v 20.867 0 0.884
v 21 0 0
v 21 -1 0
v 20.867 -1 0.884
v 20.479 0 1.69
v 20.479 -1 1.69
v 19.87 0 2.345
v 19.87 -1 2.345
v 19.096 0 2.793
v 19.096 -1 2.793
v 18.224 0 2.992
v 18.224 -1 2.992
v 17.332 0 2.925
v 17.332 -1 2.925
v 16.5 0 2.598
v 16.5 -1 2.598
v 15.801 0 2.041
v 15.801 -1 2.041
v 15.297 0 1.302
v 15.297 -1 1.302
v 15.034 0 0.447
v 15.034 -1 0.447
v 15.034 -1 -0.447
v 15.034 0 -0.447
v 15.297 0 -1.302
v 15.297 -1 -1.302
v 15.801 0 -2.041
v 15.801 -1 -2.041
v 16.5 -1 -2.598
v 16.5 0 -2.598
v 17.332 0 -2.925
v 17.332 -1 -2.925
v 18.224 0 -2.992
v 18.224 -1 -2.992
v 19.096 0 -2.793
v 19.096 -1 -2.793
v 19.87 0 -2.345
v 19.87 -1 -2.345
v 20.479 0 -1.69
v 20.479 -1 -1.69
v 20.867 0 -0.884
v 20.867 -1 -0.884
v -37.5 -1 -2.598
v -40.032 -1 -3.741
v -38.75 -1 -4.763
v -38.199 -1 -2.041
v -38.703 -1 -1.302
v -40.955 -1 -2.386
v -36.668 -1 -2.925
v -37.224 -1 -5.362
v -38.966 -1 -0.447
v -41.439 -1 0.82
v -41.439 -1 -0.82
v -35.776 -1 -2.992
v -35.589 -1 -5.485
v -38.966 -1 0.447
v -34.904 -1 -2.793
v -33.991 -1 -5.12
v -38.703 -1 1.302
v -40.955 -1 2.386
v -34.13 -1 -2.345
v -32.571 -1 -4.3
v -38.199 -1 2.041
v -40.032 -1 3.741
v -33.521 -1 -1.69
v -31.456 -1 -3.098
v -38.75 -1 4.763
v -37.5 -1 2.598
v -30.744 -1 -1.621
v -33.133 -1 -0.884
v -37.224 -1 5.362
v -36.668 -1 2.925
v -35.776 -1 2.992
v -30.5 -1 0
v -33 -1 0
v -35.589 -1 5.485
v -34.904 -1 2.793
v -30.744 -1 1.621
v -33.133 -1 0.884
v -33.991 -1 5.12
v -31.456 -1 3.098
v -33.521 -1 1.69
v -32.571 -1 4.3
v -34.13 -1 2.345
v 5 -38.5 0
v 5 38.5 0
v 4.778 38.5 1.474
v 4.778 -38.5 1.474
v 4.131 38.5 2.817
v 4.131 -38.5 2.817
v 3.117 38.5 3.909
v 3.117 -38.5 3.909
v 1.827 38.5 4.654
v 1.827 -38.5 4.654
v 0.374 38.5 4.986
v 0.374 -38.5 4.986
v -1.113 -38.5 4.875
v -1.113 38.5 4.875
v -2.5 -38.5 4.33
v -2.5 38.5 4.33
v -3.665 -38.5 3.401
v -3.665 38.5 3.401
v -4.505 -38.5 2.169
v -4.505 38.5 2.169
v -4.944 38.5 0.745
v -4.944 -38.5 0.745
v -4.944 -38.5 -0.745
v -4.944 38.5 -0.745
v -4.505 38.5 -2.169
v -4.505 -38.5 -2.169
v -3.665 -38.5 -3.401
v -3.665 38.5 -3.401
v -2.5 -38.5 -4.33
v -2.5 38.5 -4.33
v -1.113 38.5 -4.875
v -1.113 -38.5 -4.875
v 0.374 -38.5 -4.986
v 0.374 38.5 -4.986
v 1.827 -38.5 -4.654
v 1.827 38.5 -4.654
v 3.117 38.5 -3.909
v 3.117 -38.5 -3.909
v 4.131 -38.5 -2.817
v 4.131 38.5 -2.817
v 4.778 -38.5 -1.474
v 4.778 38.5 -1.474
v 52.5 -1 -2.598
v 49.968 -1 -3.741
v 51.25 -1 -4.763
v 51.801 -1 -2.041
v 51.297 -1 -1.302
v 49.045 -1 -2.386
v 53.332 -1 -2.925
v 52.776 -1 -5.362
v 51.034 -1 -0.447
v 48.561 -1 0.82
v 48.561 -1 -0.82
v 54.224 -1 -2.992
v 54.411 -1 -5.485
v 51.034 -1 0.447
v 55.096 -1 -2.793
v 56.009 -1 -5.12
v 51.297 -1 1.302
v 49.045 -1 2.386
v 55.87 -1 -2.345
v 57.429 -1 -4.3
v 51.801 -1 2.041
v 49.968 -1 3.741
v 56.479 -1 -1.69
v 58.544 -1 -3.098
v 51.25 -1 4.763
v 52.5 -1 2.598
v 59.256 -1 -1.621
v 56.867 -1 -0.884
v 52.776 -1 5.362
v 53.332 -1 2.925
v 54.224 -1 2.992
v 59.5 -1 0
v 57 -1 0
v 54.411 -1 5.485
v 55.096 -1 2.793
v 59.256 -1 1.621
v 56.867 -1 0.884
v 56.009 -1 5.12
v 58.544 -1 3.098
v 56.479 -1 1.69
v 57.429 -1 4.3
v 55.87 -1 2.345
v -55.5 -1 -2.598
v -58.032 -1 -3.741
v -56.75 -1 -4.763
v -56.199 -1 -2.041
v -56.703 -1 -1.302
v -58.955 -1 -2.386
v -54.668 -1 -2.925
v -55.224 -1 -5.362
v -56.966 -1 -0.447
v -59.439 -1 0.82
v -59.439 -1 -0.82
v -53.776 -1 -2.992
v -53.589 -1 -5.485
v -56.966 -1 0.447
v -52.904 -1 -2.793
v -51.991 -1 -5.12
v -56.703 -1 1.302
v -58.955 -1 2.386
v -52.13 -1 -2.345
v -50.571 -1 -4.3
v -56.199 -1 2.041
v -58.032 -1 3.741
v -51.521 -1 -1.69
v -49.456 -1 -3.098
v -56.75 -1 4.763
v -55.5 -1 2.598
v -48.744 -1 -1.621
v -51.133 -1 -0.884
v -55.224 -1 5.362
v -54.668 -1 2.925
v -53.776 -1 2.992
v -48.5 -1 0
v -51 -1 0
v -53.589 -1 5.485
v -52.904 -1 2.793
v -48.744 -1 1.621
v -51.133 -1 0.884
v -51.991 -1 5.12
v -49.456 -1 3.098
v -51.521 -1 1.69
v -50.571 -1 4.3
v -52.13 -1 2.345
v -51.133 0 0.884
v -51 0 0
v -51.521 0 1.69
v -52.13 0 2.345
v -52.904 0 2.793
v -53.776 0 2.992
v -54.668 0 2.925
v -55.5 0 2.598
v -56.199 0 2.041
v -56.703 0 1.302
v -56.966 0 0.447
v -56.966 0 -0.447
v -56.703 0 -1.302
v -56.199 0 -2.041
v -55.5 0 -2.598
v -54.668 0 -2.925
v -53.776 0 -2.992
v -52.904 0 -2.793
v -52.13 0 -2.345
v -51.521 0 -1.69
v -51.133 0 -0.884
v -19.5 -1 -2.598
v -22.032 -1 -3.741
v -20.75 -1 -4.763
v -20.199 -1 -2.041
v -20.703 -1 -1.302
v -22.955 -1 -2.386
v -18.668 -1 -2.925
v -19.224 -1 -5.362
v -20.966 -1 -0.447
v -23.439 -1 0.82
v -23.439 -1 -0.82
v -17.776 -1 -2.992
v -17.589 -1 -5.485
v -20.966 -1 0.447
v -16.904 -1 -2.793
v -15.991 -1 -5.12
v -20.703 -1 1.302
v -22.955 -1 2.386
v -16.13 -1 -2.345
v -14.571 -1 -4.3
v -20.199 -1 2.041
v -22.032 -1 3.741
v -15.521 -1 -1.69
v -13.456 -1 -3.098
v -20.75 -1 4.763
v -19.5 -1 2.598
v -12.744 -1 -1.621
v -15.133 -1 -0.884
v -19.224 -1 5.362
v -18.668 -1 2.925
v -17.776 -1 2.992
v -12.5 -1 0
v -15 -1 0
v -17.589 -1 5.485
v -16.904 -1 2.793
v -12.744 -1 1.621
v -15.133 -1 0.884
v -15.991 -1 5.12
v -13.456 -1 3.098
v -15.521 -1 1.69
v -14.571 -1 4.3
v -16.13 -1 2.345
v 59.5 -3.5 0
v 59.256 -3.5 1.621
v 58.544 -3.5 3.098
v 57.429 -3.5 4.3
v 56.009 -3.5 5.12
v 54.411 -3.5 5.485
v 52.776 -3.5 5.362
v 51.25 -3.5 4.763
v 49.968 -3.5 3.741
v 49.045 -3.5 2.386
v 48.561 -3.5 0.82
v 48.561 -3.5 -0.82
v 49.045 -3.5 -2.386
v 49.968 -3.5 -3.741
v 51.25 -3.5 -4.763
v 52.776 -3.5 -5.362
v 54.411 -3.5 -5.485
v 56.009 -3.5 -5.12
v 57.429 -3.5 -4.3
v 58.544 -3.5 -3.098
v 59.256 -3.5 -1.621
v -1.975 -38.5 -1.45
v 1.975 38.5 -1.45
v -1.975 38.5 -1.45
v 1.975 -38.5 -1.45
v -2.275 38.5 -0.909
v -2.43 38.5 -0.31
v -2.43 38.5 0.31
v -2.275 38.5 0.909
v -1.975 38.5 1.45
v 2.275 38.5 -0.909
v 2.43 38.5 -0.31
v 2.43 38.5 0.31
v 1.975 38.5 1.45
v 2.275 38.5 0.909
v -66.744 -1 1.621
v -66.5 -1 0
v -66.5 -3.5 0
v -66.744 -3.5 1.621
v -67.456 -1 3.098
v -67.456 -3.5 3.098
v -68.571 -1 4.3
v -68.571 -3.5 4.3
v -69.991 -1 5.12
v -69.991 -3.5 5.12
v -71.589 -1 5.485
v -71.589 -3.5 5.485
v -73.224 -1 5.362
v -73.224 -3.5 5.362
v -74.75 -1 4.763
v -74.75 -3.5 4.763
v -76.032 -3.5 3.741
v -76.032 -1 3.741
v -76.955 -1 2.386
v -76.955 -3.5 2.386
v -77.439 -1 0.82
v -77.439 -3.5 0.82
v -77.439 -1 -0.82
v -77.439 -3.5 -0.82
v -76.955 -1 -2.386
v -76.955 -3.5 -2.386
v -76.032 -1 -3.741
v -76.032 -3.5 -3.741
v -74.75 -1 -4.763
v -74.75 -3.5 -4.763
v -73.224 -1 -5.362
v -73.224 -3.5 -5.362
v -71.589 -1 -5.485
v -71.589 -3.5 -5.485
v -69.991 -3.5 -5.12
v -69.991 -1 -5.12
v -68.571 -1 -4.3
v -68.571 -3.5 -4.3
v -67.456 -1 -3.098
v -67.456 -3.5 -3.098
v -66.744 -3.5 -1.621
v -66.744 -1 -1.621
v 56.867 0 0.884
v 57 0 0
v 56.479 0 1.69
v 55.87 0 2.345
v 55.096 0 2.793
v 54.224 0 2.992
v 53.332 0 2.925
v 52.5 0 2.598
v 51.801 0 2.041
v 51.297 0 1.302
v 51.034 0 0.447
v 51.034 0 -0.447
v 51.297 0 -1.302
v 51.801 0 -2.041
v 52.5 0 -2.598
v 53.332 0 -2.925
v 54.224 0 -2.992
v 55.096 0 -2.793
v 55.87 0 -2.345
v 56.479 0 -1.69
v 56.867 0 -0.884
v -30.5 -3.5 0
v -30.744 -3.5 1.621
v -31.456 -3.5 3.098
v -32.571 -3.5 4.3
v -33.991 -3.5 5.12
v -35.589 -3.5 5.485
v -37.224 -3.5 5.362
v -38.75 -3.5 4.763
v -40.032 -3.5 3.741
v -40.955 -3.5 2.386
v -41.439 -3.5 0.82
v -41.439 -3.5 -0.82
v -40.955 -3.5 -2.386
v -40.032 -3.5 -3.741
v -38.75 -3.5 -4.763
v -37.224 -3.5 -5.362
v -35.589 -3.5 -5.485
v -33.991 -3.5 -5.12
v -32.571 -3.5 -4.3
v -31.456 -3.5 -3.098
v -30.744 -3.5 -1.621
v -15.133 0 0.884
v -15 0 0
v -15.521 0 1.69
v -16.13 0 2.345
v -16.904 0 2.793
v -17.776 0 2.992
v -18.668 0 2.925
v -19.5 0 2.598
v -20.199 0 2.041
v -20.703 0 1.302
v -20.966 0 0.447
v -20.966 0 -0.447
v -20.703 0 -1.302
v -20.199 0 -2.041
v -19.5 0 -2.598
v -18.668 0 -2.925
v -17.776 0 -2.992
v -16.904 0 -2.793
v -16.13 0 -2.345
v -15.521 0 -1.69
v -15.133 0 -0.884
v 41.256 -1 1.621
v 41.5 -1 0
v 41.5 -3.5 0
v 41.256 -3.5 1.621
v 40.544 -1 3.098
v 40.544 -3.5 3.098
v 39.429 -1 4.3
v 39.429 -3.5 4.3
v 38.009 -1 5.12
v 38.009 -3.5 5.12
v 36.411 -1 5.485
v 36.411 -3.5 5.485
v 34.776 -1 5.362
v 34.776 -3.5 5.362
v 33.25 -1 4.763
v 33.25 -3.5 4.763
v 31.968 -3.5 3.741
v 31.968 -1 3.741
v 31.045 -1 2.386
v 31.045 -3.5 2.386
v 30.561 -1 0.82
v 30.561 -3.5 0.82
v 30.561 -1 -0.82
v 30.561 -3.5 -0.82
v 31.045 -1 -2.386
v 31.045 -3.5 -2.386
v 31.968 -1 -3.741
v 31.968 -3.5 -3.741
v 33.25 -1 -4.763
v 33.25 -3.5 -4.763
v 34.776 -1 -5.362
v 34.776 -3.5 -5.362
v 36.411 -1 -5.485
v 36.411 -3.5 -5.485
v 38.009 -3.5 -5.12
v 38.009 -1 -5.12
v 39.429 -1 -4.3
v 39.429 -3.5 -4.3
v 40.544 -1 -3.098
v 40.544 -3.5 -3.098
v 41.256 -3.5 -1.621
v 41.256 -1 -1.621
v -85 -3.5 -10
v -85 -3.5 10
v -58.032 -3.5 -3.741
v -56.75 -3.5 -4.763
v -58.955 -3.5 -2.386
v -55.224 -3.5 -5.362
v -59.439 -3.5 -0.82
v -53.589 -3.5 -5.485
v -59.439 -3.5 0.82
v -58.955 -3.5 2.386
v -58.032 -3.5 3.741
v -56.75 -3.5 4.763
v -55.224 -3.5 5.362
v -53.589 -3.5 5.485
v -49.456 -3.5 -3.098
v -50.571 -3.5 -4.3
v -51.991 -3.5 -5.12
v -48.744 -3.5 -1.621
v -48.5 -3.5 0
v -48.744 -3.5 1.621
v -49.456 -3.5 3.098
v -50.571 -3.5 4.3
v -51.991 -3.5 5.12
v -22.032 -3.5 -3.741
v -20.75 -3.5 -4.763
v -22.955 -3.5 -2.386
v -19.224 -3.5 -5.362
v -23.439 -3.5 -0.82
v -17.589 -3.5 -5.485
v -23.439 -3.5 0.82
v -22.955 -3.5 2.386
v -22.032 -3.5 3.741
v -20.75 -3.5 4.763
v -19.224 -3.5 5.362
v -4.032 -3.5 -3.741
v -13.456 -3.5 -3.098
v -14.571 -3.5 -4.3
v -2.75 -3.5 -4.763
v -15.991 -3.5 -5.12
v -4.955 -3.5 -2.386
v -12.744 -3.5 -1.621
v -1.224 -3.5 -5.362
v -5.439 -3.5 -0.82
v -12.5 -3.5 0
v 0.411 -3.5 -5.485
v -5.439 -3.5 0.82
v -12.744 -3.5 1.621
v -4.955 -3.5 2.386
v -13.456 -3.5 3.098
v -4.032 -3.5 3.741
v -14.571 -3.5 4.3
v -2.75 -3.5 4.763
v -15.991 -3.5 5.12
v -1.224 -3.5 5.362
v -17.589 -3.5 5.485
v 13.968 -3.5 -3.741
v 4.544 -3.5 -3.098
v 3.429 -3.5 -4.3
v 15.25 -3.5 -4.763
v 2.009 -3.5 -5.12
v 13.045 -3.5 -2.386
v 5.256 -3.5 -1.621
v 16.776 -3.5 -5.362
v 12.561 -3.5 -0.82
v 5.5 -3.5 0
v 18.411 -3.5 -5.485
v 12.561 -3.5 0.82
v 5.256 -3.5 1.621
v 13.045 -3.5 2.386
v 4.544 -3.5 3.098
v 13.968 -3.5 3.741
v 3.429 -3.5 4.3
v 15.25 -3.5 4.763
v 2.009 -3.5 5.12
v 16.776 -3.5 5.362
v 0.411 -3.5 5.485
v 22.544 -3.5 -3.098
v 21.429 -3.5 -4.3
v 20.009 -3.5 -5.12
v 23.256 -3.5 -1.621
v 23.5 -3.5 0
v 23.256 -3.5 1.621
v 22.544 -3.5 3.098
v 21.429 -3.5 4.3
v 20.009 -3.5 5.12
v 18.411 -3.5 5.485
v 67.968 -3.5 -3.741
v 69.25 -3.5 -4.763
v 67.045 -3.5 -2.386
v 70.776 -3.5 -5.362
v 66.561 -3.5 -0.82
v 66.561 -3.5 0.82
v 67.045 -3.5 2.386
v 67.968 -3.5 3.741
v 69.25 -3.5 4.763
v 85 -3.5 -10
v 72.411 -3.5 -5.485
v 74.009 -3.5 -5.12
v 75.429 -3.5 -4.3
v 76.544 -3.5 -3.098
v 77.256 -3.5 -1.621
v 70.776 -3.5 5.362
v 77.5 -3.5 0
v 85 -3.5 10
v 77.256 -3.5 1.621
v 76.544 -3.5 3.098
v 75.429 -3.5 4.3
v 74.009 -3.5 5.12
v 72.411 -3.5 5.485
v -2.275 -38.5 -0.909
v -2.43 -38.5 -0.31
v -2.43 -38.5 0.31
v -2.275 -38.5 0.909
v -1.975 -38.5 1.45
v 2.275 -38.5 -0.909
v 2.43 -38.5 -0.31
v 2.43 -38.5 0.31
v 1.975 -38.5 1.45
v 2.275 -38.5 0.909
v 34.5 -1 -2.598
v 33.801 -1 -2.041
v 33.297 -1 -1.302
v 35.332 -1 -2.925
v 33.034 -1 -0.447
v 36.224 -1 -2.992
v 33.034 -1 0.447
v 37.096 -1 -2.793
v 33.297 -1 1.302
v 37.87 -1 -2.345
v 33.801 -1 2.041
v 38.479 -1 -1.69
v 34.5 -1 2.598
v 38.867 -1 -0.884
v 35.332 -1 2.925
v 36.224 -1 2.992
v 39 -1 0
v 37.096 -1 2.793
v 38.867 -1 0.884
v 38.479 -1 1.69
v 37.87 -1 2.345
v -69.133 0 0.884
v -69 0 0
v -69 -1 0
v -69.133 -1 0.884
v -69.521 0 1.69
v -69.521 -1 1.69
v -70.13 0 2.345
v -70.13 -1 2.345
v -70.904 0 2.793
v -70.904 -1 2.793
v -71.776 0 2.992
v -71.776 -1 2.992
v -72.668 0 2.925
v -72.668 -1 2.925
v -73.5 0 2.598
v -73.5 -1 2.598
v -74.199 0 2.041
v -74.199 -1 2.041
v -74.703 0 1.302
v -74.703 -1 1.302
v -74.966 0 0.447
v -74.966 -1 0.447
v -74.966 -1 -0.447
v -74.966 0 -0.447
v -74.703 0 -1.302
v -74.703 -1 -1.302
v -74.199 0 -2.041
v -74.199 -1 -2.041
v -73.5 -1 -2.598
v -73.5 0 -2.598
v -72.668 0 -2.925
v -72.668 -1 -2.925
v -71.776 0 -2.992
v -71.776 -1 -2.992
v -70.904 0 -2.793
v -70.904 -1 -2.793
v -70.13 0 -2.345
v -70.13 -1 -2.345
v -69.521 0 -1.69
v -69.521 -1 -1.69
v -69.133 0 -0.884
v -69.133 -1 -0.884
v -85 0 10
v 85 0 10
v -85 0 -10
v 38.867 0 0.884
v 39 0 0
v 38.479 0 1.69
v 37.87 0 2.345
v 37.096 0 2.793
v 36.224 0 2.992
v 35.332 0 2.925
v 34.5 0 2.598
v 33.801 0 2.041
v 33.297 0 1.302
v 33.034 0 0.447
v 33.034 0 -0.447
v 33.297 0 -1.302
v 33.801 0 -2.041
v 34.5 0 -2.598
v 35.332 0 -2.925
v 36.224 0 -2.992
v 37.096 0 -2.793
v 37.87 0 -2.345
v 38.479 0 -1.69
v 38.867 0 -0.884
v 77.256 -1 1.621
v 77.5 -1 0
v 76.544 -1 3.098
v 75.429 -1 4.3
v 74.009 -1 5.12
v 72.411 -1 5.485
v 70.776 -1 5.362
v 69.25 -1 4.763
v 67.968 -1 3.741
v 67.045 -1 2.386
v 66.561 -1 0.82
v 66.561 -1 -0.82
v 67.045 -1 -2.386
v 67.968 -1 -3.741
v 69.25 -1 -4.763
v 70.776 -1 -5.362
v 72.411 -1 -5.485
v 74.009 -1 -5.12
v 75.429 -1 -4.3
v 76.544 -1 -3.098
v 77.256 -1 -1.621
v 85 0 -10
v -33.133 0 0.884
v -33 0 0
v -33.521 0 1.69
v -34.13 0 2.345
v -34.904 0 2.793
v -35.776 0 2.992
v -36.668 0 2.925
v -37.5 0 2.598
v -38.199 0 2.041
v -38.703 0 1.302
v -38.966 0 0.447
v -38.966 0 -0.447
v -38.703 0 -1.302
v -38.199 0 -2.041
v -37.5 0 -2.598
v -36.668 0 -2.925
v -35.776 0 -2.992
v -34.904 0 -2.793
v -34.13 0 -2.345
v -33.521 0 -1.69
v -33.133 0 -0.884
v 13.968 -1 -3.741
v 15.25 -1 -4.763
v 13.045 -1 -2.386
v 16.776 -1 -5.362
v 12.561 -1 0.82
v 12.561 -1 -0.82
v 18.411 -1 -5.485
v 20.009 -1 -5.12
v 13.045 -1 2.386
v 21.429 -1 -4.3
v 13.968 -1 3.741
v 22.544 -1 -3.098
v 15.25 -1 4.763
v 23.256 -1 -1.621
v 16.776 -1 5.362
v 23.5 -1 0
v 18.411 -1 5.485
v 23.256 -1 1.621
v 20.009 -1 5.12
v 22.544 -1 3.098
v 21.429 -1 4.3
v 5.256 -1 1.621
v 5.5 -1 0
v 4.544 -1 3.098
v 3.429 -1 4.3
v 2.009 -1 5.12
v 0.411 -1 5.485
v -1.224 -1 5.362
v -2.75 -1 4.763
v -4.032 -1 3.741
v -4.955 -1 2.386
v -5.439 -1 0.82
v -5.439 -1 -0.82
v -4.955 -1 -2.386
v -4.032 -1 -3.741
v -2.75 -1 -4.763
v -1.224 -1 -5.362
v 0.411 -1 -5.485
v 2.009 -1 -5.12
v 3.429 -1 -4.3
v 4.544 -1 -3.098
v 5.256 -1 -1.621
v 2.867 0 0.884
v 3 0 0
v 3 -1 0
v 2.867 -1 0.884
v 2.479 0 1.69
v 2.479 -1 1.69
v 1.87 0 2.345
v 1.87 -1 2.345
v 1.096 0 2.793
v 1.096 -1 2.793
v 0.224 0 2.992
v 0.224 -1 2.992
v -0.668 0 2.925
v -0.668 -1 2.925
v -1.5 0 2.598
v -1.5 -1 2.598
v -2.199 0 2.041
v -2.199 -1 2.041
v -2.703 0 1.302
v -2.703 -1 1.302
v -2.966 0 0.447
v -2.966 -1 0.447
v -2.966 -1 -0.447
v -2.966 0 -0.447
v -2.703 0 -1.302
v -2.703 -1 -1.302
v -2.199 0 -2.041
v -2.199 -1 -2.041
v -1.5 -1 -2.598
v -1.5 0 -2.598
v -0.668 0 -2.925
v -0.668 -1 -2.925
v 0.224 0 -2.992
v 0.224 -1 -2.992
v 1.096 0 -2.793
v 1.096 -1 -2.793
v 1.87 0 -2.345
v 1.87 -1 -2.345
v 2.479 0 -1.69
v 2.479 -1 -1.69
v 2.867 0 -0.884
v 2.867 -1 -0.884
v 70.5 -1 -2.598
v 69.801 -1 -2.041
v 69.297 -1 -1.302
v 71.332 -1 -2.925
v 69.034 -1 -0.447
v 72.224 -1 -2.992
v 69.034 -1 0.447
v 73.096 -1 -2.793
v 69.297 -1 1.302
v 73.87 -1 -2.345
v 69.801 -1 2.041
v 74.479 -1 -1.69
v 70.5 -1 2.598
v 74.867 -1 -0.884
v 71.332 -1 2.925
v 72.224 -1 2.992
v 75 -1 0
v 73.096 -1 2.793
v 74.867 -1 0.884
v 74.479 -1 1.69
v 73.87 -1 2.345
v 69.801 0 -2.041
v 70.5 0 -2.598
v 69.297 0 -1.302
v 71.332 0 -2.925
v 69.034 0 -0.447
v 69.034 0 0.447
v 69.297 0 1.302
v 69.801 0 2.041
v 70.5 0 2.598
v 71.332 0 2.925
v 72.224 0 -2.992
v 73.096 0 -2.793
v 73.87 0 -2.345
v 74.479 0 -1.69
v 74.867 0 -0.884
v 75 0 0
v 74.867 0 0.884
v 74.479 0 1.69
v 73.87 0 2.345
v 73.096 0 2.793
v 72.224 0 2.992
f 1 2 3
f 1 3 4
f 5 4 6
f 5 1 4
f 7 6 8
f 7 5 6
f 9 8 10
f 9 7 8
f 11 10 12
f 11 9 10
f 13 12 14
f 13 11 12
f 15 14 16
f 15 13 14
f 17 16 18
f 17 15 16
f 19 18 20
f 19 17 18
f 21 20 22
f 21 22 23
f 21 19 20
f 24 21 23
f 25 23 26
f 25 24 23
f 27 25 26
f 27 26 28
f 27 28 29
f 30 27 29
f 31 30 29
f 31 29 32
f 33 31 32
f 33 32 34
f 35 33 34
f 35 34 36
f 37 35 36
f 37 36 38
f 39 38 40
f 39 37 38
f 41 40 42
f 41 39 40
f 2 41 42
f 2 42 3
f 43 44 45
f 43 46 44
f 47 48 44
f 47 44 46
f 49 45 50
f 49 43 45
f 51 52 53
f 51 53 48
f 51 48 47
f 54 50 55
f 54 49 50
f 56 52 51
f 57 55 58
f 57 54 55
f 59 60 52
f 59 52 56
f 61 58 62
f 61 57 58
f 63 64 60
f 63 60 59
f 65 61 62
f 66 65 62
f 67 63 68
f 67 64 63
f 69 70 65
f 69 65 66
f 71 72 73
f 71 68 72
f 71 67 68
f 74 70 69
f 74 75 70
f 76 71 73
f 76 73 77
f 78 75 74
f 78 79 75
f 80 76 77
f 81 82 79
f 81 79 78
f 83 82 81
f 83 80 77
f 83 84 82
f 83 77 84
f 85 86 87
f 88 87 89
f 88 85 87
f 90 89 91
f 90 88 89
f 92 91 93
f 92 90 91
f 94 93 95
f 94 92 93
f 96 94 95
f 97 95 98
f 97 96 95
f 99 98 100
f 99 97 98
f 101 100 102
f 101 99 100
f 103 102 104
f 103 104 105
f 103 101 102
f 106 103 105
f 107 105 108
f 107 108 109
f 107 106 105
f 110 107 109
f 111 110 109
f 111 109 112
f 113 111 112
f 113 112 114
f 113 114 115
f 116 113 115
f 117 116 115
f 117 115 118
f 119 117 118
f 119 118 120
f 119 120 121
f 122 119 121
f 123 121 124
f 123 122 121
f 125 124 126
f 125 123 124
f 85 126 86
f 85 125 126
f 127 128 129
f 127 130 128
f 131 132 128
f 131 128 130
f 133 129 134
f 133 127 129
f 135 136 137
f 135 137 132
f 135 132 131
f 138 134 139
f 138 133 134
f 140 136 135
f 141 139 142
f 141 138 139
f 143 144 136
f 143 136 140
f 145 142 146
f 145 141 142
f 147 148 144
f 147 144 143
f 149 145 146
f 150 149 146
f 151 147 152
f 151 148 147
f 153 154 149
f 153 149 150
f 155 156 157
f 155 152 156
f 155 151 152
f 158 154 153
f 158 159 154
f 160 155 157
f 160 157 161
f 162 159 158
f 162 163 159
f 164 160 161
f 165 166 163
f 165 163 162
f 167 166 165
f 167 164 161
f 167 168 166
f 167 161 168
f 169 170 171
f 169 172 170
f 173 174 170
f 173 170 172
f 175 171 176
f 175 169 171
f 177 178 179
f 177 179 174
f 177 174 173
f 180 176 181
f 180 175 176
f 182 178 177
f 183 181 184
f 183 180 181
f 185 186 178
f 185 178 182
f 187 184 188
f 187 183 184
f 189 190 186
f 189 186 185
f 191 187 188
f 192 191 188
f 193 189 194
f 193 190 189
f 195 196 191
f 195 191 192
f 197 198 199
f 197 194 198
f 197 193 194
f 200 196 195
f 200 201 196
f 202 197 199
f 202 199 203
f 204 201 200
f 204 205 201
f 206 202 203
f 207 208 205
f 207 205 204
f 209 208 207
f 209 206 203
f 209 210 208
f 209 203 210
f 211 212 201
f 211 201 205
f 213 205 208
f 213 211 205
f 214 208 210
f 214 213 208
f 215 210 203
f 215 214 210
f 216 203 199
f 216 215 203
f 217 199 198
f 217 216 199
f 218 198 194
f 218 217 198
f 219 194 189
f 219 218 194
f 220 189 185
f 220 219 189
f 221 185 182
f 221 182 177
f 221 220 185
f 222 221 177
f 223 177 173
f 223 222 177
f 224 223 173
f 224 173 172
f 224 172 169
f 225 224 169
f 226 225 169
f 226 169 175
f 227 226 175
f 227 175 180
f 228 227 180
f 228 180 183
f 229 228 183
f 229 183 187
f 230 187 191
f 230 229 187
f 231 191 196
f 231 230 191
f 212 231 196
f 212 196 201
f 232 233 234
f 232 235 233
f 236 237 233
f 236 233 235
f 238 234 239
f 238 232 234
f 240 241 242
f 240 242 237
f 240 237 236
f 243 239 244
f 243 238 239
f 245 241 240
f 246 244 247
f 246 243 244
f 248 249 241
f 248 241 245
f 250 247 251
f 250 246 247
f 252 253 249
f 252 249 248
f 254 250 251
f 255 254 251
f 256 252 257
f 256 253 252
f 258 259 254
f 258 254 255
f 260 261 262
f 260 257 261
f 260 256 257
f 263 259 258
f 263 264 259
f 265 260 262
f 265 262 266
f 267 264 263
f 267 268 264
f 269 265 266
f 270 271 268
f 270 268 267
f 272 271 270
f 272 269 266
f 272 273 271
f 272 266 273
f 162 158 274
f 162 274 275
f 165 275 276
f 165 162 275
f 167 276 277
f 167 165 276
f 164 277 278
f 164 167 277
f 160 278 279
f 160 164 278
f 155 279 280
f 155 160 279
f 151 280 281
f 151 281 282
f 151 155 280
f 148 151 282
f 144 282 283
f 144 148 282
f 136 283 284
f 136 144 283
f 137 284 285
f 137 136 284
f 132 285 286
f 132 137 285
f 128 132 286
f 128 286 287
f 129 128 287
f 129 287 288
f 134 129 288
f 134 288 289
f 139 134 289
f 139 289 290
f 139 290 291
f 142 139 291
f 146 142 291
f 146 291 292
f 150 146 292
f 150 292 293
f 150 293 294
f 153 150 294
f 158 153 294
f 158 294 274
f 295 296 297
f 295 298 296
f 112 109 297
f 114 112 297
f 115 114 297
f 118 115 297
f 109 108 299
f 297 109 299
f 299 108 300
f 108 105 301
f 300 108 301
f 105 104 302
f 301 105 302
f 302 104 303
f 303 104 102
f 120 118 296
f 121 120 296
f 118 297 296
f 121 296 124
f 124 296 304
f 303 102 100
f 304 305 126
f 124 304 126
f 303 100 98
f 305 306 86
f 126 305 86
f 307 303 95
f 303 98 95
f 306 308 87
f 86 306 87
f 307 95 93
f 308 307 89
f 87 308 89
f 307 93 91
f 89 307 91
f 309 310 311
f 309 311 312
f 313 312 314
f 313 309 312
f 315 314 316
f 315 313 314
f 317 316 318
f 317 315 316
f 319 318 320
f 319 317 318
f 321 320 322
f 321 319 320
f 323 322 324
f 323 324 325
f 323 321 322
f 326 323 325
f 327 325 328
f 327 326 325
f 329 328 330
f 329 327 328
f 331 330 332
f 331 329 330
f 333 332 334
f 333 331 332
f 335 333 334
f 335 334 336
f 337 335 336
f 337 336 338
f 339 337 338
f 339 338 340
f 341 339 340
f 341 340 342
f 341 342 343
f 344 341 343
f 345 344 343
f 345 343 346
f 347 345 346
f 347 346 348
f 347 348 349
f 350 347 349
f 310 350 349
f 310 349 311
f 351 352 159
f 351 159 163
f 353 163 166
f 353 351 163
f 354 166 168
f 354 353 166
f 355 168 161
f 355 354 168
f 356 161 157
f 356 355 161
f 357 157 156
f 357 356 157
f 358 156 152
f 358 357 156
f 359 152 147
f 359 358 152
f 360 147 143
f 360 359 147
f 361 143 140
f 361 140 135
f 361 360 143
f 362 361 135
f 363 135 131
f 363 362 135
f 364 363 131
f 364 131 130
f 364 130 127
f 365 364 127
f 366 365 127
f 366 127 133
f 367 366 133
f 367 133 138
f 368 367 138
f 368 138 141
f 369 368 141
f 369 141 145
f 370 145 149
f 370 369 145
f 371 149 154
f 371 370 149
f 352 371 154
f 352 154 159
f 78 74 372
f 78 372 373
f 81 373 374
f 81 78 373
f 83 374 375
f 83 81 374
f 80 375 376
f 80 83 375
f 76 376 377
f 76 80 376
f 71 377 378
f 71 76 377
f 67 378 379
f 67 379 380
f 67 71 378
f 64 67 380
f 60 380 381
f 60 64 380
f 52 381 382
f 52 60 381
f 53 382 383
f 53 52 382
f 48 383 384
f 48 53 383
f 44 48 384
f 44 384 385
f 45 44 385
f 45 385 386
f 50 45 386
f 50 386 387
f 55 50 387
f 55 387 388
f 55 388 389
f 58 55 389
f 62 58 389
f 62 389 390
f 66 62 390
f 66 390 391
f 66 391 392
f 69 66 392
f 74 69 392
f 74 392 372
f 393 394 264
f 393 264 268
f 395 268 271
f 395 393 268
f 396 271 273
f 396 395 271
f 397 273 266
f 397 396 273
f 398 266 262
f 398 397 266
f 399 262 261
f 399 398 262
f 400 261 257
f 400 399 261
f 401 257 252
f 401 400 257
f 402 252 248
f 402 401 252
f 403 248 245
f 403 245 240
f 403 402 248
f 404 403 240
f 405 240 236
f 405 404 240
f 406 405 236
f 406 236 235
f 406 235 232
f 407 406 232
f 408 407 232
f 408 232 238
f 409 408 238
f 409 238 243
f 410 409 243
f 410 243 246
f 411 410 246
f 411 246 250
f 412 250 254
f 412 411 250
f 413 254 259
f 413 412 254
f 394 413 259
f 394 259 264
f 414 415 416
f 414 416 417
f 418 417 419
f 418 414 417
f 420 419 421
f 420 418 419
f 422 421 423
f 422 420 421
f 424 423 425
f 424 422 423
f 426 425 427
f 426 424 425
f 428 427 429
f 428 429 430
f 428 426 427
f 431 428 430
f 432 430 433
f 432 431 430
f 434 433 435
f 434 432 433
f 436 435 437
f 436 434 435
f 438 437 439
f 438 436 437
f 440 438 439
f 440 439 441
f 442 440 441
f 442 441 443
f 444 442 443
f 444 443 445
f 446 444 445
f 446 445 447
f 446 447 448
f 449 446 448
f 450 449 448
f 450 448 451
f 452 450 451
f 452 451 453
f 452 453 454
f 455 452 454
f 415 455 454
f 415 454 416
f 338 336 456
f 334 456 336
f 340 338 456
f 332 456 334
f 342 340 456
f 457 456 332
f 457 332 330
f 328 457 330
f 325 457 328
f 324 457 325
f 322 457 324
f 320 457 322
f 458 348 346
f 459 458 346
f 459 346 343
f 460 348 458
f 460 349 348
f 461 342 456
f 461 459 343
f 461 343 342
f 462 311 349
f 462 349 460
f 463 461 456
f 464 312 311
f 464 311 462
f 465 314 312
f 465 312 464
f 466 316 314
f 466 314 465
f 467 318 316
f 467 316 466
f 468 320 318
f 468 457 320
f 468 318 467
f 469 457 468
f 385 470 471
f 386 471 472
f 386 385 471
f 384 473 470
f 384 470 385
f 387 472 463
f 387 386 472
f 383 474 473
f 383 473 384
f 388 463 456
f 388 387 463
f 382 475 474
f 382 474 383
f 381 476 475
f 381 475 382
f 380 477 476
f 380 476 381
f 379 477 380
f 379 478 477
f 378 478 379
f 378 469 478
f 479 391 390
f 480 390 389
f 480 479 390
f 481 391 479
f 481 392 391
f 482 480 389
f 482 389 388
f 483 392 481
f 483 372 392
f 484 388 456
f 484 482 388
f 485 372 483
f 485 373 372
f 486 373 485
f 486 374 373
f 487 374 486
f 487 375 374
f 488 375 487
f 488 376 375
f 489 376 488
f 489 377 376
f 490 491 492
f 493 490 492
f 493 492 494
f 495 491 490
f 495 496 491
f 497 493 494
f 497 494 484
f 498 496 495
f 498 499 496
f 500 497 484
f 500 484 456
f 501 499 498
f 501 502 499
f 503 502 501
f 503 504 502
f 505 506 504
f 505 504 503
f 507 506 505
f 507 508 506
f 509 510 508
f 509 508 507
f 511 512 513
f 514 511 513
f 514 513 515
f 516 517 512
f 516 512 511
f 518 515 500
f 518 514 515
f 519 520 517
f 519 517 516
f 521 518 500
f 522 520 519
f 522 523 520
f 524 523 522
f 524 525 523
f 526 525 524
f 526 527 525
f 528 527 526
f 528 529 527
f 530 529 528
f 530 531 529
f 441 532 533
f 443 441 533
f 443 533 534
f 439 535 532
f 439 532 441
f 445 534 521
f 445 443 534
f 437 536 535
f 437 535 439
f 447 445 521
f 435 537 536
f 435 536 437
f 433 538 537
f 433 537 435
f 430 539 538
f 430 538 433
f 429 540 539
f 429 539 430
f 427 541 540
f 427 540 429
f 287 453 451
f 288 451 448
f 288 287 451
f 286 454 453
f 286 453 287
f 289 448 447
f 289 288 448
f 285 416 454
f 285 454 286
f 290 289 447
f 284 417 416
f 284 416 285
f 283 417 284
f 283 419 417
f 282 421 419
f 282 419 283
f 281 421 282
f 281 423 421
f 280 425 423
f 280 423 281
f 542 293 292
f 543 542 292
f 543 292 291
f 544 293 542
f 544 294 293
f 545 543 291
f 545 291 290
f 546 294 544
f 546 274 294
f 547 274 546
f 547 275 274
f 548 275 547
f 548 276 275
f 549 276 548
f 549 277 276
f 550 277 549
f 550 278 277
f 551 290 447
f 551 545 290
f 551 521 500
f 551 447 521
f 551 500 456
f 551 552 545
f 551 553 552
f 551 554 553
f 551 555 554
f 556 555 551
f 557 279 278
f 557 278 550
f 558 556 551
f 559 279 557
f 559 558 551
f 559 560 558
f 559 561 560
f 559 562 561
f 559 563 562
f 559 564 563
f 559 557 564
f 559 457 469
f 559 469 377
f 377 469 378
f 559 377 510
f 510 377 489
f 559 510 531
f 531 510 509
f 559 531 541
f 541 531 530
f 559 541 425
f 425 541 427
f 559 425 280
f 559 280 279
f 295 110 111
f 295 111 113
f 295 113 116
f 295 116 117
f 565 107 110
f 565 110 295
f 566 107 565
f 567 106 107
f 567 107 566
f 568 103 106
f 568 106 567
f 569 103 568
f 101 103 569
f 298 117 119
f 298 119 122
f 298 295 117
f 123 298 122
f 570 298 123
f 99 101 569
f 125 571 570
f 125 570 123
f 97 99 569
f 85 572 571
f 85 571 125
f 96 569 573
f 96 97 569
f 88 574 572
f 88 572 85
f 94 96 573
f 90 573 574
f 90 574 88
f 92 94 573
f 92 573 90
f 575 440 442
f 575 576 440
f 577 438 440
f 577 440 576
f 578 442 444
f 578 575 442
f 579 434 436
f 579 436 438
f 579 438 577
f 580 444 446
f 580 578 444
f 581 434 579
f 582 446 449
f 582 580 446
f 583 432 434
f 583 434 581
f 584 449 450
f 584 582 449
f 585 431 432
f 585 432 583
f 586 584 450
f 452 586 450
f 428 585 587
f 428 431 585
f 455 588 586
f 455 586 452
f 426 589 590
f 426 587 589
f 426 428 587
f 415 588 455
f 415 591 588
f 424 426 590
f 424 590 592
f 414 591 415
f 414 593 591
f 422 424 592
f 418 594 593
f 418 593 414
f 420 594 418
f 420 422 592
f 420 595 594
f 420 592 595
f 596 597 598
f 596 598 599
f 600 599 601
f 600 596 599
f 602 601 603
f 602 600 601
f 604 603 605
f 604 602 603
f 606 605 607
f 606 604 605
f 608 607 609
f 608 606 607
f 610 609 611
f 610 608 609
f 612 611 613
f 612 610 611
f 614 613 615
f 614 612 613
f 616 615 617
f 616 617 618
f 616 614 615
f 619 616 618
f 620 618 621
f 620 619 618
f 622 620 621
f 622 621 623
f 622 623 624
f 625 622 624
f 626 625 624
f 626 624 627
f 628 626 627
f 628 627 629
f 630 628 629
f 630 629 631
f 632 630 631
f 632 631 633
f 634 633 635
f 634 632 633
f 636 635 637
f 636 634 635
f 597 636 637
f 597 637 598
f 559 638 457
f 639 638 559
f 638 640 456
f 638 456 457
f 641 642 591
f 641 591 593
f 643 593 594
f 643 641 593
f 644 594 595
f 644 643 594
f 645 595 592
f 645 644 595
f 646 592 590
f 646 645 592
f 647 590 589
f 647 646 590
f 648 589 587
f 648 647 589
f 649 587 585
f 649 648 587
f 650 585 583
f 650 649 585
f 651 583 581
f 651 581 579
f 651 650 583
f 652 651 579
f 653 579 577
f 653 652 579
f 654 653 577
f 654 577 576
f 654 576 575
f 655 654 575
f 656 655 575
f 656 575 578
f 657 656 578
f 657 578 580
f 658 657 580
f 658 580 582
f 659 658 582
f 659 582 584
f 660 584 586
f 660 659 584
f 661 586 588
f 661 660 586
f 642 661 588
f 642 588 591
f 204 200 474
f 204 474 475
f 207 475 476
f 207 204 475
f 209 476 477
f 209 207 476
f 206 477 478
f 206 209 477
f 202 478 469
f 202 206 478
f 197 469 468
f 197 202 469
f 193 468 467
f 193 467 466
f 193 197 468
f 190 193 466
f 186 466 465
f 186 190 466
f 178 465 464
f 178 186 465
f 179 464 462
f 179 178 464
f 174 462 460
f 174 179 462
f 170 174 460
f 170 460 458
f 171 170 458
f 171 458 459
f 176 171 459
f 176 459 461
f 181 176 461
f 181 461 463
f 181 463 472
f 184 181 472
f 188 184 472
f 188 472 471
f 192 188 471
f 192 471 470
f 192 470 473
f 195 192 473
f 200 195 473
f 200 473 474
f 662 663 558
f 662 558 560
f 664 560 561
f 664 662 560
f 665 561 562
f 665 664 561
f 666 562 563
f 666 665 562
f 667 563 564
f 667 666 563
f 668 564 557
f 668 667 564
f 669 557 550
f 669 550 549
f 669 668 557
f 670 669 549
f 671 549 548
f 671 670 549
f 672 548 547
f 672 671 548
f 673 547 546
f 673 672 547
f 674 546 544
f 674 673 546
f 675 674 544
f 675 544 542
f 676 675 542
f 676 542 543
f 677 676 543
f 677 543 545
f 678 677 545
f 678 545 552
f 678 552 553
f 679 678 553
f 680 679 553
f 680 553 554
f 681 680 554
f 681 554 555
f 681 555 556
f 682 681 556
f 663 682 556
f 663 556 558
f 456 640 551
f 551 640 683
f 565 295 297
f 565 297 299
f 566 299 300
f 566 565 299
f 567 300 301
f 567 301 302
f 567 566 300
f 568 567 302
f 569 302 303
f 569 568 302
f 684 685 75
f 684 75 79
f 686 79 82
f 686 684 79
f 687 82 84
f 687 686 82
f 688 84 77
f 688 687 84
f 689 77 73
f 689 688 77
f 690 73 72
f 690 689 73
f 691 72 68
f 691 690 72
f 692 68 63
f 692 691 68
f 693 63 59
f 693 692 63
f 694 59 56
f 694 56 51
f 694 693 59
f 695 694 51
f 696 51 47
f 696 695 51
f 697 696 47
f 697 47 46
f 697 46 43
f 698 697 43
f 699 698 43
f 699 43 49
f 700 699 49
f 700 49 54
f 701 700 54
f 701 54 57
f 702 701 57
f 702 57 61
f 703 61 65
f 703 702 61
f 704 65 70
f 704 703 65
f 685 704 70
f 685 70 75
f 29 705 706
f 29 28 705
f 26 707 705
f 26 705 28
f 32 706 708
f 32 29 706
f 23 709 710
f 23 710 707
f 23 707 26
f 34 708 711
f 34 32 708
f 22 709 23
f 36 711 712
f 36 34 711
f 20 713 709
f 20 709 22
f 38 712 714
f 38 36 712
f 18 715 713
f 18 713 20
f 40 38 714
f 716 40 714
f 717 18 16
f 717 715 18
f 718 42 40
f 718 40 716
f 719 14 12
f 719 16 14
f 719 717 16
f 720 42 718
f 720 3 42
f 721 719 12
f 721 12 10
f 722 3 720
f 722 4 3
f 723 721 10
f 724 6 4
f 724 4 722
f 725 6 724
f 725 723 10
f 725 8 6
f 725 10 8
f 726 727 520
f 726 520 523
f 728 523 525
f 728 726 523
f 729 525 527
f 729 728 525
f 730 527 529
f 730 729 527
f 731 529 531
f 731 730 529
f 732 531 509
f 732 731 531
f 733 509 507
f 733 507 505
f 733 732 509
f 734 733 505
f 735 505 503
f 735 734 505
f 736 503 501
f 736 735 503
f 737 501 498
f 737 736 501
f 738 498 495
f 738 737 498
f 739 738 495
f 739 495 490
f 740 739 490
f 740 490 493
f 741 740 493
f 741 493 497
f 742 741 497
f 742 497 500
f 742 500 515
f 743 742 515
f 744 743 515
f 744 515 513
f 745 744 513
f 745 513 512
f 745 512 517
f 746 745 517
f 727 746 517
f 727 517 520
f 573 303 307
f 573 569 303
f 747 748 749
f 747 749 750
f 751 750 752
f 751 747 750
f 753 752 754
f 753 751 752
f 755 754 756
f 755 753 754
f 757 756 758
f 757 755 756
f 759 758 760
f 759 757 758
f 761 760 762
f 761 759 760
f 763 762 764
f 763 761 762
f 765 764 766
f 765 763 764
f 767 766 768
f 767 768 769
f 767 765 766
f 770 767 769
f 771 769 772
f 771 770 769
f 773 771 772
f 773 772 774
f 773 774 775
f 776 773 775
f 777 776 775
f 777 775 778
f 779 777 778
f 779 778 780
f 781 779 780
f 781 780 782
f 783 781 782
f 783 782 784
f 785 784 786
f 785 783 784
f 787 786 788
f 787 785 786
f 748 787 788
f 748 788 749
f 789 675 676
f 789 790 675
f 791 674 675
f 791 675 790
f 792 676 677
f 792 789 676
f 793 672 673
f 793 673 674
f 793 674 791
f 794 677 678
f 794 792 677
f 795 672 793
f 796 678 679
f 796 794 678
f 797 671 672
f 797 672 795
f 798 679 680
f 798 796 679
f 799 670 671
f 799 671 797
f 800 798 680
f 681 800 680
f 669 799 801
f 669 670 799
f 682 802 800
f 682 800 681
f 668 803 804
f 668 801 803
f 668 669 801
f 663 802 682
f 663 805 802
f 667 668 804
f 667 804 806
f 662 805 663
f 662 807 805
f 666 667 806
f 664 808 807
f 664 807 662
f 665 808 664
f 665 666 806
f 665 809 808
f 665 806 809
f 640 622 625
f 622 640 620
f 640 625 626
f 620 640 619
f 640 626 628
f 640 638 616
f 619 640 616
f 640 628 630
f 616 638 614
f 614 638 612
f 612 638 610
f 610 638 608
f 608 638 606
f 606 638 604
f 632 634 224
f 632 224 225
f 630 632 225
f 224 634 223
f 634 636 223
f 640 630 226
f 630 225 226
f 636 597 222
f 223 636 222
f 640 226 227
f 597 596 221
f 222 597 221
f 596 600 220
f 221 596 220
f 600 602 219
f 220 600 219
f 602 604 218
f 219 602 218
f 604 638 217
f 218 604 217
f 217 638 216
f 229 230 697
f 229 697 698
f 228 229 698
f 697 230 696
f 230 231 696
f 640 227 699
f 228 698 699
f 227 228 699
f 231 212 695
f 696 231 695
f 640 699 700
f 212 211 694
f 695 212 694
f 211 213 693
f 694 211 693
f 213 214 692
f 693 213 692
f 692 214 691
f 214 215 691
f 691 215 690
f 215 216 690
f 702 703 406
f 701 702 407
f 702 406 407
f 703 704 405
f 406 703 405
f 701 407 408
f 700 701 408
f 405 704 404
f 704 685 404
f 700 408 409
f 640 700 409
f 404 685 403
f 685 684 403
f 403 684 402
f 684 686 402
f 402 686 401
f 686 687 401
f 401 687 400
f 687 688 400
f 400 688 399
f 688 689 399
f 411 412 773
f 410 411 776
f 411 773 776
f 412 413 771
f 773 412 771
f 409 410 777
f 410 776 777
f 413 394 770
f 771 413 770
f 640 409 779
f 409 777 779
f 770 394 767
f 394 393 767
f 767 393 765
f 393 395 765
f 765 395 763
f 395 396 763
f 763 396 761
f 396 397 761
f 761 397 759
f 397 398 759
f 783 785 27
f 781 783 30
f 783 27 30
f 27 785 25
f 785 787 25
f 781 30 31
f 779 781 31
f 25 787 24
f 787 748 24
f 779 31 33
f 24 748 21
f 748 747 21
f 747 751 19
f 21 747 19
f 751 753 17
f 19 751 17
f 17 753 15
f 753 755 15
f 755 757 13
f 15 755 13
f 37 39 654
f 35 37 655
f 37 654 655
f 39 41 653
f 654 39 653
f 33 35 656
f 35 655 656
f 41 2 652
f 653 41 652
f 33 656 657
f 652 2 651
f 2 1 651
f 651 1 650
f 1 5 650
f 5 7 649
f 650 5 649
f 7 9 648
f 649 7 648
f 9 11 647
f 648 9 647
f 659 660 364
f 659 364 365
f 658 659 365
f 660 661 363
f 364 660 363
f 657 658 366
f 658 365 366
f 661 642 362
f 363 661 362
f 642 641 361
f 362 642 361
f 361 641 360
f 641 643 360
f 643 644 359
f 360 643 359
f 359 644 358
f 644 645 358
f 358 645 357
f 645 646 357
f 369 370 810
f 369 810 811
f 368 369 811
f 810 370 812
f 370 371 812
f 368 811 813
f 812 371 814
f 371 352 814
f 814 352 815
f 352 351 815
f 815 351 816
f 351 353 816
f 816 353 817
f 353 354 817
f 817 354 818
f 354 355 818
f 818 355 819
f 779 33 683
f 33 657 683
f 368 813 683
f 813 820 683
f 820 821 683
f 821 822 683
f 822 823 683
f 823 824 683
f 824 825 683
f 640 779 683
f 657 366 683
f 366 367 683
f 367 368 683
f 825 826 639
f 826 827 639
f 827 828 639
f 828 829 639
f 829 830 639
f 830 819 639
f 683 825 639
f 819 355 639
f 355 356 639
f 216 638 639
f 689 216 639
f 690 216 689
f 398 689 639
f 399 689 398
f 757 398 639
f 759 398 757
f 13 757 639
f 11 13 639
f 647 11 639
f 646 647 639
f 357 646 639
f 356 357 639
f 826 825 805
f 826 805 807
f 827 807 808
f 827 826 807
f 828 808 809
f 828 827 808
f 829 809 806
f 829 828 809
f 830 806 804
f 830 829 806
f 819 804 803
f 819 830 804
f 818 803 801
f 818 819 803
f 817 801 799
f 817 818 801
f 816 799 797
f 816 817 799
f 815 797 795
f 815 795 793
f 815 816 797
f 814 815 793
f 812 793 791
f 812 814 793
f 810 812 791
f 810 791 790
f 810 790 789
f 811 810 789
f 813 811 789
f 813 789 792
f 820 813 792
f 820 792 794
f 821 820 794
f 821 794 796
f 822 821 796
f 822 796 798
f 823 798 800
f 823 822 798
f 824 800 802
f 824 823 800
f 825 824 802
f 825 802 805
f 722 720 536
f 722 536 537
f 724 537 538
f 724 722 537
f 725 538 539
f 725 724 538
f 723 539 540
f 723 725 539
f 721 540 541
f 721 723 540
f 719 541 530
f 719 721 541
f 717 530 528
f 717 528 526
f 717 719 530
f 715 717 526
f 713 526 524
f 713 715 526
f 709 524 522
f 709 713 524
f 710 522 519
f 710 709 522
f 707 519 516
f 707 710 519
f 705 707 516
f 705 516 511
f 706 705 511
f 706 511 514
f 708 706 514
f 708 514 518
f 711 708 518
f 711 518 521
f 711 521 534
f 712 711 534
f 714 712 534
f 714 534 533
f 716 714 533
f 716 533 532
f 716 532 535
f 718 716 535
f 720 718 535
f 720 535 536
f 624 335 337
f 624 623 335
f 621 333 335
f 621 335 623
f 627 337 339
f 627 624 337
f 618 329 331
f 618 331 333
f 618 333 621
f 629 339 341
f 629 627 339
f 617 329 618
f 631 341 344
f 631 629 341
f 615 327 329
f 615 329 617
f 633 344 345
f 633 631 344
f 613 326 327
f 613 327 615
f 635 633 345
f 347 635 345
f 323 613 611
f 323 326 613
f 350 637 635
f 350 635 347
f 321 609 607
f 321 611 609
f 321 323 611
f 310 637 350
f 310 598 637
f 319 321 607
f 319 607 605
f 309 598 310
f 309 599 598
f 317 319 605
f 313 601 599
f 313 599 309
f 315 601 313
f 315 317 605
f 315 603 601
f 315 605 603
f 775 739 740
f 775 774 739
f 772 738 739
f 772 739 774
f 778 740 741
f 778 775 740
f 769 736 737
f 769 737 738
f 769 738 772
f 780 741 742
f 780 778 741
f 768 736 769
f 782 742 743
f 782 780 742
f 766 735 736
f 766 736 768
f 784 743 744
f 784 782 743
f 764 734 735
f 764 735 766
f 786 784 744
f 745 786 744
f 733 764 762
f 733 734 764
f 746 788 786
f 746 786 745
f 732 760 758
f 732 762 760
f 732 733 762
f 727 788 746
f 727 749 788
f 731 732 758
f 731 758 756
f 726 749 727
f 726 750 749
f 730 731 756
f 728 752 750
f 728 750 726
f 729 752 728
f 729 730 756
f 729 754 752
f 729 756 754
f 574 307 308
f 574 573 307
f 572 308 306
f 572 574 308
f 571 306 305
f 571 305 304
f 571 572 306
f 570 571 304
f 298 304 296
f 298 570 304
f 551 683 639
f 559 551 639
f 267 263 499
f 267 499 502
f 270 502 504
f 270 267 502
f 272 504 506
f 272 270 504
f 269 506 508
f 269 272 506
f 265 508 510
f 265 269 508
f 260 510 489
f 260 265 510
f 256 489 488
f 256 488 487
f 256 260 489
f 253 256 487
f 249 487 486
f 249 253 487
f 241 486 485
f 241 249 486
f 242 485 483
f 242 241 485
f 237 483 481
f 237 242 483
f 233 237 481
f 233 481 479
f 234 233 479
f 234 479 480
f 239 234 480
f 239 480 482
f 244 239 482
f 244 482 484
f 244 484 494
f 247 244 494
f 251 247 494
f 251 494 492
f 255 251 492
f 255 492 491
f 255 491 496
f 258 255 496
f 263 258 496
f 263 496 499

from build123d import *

# Parameters (mm, degrees)
F0_R     = 5
F1_DEPTH = 38.5
F2_W     = 170
F2_H     = 20
F2_R     = 5.5
F3_DEPTH = 3.5
F2_R_2   = 3
F4_DEPTH = 1


with BuildPart() as f1:
    # F0 (on Front) → F1 (new body, symmetric)
    with BuildSketch(Plane.XZ):
        Circle(F0_R)
        with BuildLine():
            ThreePointArc((-1.9748417658, -1.45), (-2.45, 0), (-1.9748417658, 1.45))
            Line((-1.9748417658, 1.45), (1.9748417658, 1.45))
            ThreePointArc((1.9748417658, 1.45), (2.45, 0), (1.9748417658, -1.45))
            Line((1.9748417658, -1.45), (-1.9748417658, -1.45))
        make_face(mode=Mode.SUBTRACT)
    extrude(amount=F1_DEPTH, both=True)


with BuildPart() as f3:
    # F2 (on Front) → F3 (new body)
    with BuildSketch(Plane.XZ):
        Rectangle(F2_W, F2_H)
        with Locations((-72, 0)):
            Circle(F2_R, mode=Mode.SUBTRACT)
        with Locations((-54, 0)):
            Circle(F2_R, mode=Mode.SUBTRACT)
        with Locations((-36, 0)):
            Circle(F2_R, mode=Mode.SUBTRACT)
        with Locations((-18, 0)):
            Circle(F2_R, mode=Mode.SUBTRACT)
        Circle(F2_R, mode=Mode.SUBTRACT)
        with Locations((18, 0)):
            Circle(F2_R, mode=Mode.SUBTRACT)
        with Locations((36, 0)):
            Circle(F2_R, mode=Mode.SUBTRACT)
        with Locations((54, 0)):
            Circle(F2_R, mode=Mode.SUBTRACT)
        with Locations((72, 0)):
            Circle(F2_R, mode=Mode.SUBTRACT)
    extrude(amount=F3_DEPTH)

    # F2 (on Front) → F4 (join)
    with BuildSketch(Plane.XZ):
        with Locations((-72, 0)):
            Circle(F2_R)
        with Locations((-72, 0)):
            Circle(F2_R_2, mode=Mode.SUBTRACT)
        with Locations((-54, 0)):
            Circle(F2_R)
        with Locations((-54, 0)):
            Circle(F2_R_2, mode=Mode.SUBTRACT)
        with Locations((-36, 0)):
            Circle(F2_R)
        with Locations((-36, 0)):
            Circle(F2_R_2, mode=Mode.SUBTRACT)
        with Locations((-18, 0)):
            Circle(F2_R)
        with Locations((-18, 0)):
            Circle(F2_R_2, mode=Mode.SUBTRACT)
        Circle(F2_R)
        Circle(F2_R_2, mode=Mode.SUBTRACT)
        with Locations((18, 0)):
            Circle(F2_R)
        with Locations((18, 0)):
            Circle(F2_R_2, mode=Mode.SUBTRACT)
        with Locations((36, 0)):
            Circle(F2_R)
        with Locations((36, 0)):
            Circle(F2_R_2, mode=Mode.SUBTRACT)
        with Locations((54, 0)):
            Circle(F2_R)
        with Locations((54, 0)):
            Circle(F2_R_2, mode=Mode.SUBTRACT)
        with Locations((72, 0)):
            Circle(F2_R)
        with Locations((72, 0)):
            Circle(F2_R_2, mode=Mode.SUBTRACT)
    extrude(amount=F4_DEPTH)


solid = Compound([f1.part, f3.part])
